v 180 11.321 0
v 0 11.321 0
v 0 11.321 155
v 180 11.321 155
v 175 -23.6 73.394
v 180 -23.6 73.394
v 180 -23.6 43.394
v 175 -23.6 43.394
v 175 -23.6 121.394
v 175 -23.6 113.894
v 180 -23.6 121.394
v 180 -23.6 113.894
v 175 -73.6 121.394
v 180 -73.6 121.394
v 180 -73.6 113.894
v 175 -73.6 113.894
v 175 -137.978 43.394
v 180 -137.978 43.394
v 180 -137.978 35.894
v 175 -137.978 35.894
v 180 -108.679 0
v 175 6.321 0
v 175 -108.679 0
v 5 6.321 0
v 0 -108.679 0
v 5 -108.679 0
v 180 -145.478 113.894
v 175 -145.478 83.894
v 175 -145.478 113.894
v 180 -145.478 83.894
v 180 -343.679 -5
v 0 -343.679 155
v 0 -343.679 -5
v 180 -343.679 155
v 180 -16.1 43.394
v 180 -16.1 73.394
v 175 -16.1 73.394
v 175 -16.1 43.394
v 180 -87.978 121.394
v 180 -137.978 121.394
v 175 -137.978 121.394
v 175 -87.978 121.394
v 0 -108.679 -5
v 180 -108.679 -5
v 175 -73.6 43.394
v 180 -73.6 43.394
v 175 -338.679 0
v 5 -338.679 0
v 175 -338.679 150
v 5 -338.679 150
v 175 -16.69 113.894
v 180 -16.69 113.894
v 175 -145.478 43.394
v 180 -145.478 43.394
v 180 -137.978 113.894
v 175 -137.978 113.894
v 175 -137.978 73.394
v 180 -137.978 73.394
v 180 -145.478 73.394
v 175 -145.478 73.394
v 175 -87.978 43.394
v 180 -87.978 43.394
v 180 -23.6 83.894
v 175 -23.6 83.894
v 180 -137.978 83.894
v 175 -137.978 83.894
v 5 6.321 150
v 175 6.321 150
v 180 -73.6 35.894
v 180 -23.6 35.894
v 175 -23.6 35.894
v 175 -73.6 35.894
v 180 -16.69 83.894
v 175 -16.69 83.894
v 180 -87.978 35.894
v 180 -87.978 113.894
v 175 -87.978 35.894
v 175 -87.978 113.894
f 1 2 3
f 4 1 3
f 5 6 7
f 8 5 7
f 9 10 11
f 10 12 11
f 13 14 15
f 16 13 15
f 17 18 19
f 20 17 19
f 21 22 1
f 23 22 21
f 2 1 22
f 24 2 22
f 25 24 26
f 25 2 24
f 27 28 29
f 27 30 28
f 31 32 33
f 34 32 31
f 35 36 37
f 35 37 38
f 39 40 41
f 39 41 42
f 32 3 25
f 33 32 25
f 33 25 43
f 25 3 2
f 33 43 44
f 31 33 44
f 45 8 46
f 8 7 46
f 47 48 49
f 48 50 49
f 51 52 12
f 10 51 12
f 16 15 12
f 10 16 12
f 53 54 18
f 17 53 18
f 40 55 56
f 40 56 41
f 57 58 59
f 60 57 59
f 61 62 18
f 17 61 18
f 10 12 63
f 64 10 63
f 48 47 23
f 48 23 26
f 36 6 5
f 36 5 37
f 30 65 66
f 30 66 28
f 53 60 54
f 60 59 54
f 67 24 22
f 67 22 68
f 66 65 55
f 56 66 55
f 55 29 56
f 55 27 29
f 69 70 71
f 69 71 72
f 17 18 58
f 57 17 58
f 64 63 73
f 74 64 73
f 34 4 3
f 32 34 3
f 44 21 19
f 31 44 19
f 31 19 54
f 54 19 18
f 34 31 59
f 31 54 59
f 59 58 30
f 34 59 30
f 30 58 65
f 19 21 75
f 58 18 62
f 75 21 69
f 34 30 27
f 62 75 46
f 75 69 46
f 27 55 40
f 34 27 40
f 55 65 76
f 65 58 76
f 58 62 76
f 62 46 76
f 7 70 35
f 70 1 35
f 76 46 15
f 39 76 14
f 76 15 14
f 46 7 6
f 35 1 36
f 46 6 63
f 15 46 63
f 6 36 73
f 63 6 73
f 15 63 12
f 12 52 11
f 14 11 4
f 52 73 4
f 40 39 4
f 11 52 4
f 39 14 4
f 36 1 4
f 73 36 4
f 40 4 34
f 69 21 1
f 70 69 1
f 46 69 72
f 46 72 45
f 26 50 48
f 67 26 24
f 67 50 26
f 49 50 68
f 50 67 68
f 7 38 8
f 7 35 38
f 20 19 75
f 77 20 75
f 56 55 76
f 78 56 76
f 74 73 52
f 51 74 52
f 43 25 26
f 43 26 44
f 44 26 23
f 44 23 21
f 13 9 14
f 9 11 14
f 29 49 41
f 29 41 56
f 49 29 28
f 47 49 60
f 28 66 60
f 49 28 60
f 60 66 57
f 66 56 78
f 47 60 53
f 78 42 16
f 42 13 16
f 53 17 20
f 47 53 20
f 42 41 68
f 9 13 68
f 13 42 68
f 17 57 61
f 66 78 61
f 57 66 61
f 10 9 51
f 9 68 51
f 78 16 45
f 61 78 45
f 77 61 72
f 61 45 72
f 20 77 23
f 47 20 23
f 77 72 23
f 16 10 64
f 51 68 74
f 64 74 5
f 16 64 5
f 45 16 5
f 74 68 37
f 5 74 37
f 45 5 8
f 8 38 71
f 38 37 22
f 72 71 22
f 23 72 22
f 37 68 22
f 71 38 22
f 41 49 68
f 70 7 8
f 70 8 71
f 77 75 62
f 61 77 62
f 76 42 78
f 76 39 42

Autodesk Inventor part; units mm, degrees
ref_plane "YZ Plane" through (0, 0, 0) normal (1, 0, 0) x (0, 1, 0)
ref_plane "XZ Plane" through (0, 0, 0) normal (0, 1, 0) x (-1, 0, 0)
ref_plane "XY Plane" through (0, 0, 0) normal (0, 0, 1) x (1, 0, 0)
sketch "Sketch1" plane through (0, 0, 0) normal (1, 0, 0) x (0, 1, 0)
  line L0 (11.3212, 0) -> (-338.6788, 0)
  line L1 (-338.6788, 0) -> (-338.6788, 150)
  line L2 (-338.6788, 150) -> (11.3212, 150)
  line L3 (11.3212, 150) -> (11.3212, 0)
  point P0 (0, 0)
  dimension "d0" = 350
  dimension "d1" = 150
extrude "Extrusion1" add sketch "Sketch1" along normal blind 5
sketch "Sketch2" plane through (5, 0, 0) normal (1, 0, 0) x (0, 0, -1)
  line L0 (-150, 11.3212) -> (-150, -338.6788) projected
  line L1 (0, -338.6788) -> (0, 11.3212) projected
  line L2 (-150, 11.3212) -> (0, 11.3212)
  line L3 (0, 11.3212) -> (0, 6.3212)
  line L4 (0, 6.3212) -> (-150, 6.3212)
  line L5 (-150, 6.3212) -> (-150, 11.3212)
  point P0 (0, 0)
  point P1 (0, 11.3212)
  dimension "d4" = 5
extrude "Extrusion2" add sketch "Sketch2" along normal blind 170
sketch "Sketch3" plane through (0, -338.6788, 150) normal (0, 0, 1) x (1, 0, 0)
  point P0 (0, 338.6788)
sketch "Sketch4" plane through (0, -338.6788, 150) normal (0, 0, 1) x (1, 0, 0)
  line L0 (0, 350) -> (0, 0) projected
  line L1 (0, 350) -> (175.2508, 350)
  line L2 (175.2508, 350) -> (175.2508, 0)
  line L3 (175.2508, 0) -> (0, 0)
  line L4 (0, 0) -> (0, 350)
  point P0 (0, 338.6788)
extrude "Extrusion3" add sketch "Sketch4" along normal blind 5
sketch "Sketch5" plane through (175, 0, 0) normal (1, 0, 0) x (0, 0, -1)
  line L0 (0, 11.3212) -> (-155, 11.3212) projected
  line L1 (-155, 11.3212) -> (0, 11.3212)
  line L2 (0, 11.3212) -> (0, -338.6788)
  line L3 (0, -338.6788) -> (-155, -338.6788)
  line L4 (-155, -338.6788) -> (-155, 11.3212)
  point P0 (0, 0)
extrude "Extrusion4" add sketch "Sketch5" along normal blind 5
sketch "Sketch6" plane through (0, -338.6788, 0) normal (0, 0, -1) x (-1, 0, 0)
  line L0 (-180, 0) -> (-180, 350) projected
  line L1 (-180, 0) -> (0, 0)
  line L2 (0, 0) -> (0, 230)
  line L3 (0, 230) -> (-180, 230)
  line L4 (-180, 230) -> (-180, 0)
  point P0 (0, 338.6788)
  point P1 (-180, 230)
  dimension "d34" = 230
extrude "Extrusion5" add sketch "Sketch6" along normal blind 5
sketch "Sketch7" plane through (0, -338.6788, 155) normal (0, -1, 0) x (1, 0, 0)
  line L0 (180, -155) -> (180, 0) projected
  line L1 (0, -160) -> (180, -160) projected
  line L2 (180, 0) -> (0, 0)
  line L3 (0, 0) -> (0, -160)
  line L4 (0, -160) -> (180, -160)
  line L5 (180, -160) -> (180, 0)
  point P0 (0, -155)
extrude "Extrusion6" add sketch "Sketch7" along normal blind 5
sketch "Sketch8" plane through (180, 0, 0) normal (1, 0, 0) x (0, 0, -1)
  point P0 (0, 0)
sketch "Sketch9" plane through (180, 0, 0) normal (1, 0, 0) x (0, 0, -1)
  line L0 (-113.8942, -23.5999) -> (-43.3942, -23.5999)
  line L1 (-43.3942, -23.5999) -> (-43.3942, -137.9783)
  line L2 (-43.3942, -137.9783) -> (-113.8942, -137.9783)
  line L3 (-113.8942, -137.9783) -> (-113.8942, -23.5999)
  line L4 (-43.3942, -73.5999) -> (-43.3942, -23.5999)
  line L5 (-43.3942, -137.9783) -> (-35.8942, -137.9783)
  line L6 (-35.8942, -137.9783) -> (-35.8942, -87.9783)
  line L7 (-35.8942, -87.9783) -> (-43.3942, -87.9783)
  line L8 (-43.3942, -87.9783) -> (-43.3942, -137.9783)
  line L9 (-43.3942, -65.8129) -> (-43.3942, -23.5999)
  line L10 (-113.8942, -23.5999) -> (-121.3942, -23.5999)
  line L11 (-121.3942, -23.5999) -> (-121.3942, -73.5999)
  line L12 (-121.3942, -73.5999) -> (-113.8942, -73.5999)
  line L13 (-113.8942, -73.5999) -> (-113.8942, -23.5999)
  line L14 (-113.8942, -137.9783) -> (-121.3942, -137.9783)
  line L15 (-121.3942, -137.9783) -> (-121.3942, -87.9783)
  line L16 (-121.3942, -87.9783) -> (-113.8942, -87.9783)
  line L17 (-113.8942, -87.9783) -> (-113.8942, -137.9783)
  line L18 (-113.8942, -137.9783) -> (-83.8942, -137.9783)
  line L19 (-83.8942, -137.9783) -> (-83.8942, -145.4783)
  line L20 (-83.8942, -145.4783) -> (-113.8942, -145.4783)
  line L21 (-113.8942, -145.4783) -> (-113.8942, -137.9783)
  line L22 (-43.3942, -137.9783) -> (-73.3942, -137.9783)
  line L23 (-73.3942, -137.9783) -> (-73.3942, -145.4783)
  line L24 (-73.3942, -145.4783) -> (-43.3942, -145.4783)
  line L25 (-43.3942, -145.4783) -> (-43.3942, -137.9783)
  line L26 (-43.3942, -23.5999) -> (-35.8942, -23.5999)
  line L27 (-35.8942, -23.5999) -> (-35.8942, -73.5999)
  line L28 (-35.8942, -73.5999) -> (-43.3942, -73.5999)
  line L29 (-43.3942, -73.5999) -> (-43.3942, -23.5999)
  line L30 (-113.8942, -23.5999) -> (-83.8942, -23.5999)
  line L31 (-83.8942, -23.5999) -> (-83.8942, -16.6897)
  line L32 (-83.8942, -16.6897) -> (-113.8942, -16.6897)
  line L33 (-113.8942, -16.6897) -> (-113.8942, -23.5999)
  line L34 (-73.3942, -16.0999) -> (-43.3942, -16.0999)
  line L35 (-43.3942, -16.0999) -> (-43.3942, -23.5999)
  line L36 (-43.3942, -23.5999) -> (-73.3942, -23.5999)
  line L37 (-73.3942, -23.5999) -> (-73.3942, -16.0999)
  point P0 (0, 0)
  dimension "d18" = 7.5
  dimension "d19" = 7.5
  dimension "d20" = 30
  dimension "d21" = 30
  dimension "d22" = 7.5
  dimension "d23" = 50
  dimension "d24" = 50
  dimension "d25" = 50
  dimension "d26" = 50
  dimension "d27" = 7.5
  dimension "d28" = 7.5
  dimension "d29" = 30
  dimension "d30" = 30
  dimension "d31" = 7.5
extrude "Extrusion7" cut sketch "Sketch9" against normal blind 5 contours L33 L32 L31 L0 | L3 L12 L11 L10 | L37 L34 L35 L0 | L3 L14 L15 L16 | L26 L27 L28 L1 | L2 L19 L20 L21 | L2 L25 L24 L23 | L7 L6 L5 L1
sketch "Sketch10" plane through (180, 0, 0) normal (1, 0, 0) x (0, 0, -1)
  point P0 (0, 0)
properties part number "button unit" material "Pine, Southern"
